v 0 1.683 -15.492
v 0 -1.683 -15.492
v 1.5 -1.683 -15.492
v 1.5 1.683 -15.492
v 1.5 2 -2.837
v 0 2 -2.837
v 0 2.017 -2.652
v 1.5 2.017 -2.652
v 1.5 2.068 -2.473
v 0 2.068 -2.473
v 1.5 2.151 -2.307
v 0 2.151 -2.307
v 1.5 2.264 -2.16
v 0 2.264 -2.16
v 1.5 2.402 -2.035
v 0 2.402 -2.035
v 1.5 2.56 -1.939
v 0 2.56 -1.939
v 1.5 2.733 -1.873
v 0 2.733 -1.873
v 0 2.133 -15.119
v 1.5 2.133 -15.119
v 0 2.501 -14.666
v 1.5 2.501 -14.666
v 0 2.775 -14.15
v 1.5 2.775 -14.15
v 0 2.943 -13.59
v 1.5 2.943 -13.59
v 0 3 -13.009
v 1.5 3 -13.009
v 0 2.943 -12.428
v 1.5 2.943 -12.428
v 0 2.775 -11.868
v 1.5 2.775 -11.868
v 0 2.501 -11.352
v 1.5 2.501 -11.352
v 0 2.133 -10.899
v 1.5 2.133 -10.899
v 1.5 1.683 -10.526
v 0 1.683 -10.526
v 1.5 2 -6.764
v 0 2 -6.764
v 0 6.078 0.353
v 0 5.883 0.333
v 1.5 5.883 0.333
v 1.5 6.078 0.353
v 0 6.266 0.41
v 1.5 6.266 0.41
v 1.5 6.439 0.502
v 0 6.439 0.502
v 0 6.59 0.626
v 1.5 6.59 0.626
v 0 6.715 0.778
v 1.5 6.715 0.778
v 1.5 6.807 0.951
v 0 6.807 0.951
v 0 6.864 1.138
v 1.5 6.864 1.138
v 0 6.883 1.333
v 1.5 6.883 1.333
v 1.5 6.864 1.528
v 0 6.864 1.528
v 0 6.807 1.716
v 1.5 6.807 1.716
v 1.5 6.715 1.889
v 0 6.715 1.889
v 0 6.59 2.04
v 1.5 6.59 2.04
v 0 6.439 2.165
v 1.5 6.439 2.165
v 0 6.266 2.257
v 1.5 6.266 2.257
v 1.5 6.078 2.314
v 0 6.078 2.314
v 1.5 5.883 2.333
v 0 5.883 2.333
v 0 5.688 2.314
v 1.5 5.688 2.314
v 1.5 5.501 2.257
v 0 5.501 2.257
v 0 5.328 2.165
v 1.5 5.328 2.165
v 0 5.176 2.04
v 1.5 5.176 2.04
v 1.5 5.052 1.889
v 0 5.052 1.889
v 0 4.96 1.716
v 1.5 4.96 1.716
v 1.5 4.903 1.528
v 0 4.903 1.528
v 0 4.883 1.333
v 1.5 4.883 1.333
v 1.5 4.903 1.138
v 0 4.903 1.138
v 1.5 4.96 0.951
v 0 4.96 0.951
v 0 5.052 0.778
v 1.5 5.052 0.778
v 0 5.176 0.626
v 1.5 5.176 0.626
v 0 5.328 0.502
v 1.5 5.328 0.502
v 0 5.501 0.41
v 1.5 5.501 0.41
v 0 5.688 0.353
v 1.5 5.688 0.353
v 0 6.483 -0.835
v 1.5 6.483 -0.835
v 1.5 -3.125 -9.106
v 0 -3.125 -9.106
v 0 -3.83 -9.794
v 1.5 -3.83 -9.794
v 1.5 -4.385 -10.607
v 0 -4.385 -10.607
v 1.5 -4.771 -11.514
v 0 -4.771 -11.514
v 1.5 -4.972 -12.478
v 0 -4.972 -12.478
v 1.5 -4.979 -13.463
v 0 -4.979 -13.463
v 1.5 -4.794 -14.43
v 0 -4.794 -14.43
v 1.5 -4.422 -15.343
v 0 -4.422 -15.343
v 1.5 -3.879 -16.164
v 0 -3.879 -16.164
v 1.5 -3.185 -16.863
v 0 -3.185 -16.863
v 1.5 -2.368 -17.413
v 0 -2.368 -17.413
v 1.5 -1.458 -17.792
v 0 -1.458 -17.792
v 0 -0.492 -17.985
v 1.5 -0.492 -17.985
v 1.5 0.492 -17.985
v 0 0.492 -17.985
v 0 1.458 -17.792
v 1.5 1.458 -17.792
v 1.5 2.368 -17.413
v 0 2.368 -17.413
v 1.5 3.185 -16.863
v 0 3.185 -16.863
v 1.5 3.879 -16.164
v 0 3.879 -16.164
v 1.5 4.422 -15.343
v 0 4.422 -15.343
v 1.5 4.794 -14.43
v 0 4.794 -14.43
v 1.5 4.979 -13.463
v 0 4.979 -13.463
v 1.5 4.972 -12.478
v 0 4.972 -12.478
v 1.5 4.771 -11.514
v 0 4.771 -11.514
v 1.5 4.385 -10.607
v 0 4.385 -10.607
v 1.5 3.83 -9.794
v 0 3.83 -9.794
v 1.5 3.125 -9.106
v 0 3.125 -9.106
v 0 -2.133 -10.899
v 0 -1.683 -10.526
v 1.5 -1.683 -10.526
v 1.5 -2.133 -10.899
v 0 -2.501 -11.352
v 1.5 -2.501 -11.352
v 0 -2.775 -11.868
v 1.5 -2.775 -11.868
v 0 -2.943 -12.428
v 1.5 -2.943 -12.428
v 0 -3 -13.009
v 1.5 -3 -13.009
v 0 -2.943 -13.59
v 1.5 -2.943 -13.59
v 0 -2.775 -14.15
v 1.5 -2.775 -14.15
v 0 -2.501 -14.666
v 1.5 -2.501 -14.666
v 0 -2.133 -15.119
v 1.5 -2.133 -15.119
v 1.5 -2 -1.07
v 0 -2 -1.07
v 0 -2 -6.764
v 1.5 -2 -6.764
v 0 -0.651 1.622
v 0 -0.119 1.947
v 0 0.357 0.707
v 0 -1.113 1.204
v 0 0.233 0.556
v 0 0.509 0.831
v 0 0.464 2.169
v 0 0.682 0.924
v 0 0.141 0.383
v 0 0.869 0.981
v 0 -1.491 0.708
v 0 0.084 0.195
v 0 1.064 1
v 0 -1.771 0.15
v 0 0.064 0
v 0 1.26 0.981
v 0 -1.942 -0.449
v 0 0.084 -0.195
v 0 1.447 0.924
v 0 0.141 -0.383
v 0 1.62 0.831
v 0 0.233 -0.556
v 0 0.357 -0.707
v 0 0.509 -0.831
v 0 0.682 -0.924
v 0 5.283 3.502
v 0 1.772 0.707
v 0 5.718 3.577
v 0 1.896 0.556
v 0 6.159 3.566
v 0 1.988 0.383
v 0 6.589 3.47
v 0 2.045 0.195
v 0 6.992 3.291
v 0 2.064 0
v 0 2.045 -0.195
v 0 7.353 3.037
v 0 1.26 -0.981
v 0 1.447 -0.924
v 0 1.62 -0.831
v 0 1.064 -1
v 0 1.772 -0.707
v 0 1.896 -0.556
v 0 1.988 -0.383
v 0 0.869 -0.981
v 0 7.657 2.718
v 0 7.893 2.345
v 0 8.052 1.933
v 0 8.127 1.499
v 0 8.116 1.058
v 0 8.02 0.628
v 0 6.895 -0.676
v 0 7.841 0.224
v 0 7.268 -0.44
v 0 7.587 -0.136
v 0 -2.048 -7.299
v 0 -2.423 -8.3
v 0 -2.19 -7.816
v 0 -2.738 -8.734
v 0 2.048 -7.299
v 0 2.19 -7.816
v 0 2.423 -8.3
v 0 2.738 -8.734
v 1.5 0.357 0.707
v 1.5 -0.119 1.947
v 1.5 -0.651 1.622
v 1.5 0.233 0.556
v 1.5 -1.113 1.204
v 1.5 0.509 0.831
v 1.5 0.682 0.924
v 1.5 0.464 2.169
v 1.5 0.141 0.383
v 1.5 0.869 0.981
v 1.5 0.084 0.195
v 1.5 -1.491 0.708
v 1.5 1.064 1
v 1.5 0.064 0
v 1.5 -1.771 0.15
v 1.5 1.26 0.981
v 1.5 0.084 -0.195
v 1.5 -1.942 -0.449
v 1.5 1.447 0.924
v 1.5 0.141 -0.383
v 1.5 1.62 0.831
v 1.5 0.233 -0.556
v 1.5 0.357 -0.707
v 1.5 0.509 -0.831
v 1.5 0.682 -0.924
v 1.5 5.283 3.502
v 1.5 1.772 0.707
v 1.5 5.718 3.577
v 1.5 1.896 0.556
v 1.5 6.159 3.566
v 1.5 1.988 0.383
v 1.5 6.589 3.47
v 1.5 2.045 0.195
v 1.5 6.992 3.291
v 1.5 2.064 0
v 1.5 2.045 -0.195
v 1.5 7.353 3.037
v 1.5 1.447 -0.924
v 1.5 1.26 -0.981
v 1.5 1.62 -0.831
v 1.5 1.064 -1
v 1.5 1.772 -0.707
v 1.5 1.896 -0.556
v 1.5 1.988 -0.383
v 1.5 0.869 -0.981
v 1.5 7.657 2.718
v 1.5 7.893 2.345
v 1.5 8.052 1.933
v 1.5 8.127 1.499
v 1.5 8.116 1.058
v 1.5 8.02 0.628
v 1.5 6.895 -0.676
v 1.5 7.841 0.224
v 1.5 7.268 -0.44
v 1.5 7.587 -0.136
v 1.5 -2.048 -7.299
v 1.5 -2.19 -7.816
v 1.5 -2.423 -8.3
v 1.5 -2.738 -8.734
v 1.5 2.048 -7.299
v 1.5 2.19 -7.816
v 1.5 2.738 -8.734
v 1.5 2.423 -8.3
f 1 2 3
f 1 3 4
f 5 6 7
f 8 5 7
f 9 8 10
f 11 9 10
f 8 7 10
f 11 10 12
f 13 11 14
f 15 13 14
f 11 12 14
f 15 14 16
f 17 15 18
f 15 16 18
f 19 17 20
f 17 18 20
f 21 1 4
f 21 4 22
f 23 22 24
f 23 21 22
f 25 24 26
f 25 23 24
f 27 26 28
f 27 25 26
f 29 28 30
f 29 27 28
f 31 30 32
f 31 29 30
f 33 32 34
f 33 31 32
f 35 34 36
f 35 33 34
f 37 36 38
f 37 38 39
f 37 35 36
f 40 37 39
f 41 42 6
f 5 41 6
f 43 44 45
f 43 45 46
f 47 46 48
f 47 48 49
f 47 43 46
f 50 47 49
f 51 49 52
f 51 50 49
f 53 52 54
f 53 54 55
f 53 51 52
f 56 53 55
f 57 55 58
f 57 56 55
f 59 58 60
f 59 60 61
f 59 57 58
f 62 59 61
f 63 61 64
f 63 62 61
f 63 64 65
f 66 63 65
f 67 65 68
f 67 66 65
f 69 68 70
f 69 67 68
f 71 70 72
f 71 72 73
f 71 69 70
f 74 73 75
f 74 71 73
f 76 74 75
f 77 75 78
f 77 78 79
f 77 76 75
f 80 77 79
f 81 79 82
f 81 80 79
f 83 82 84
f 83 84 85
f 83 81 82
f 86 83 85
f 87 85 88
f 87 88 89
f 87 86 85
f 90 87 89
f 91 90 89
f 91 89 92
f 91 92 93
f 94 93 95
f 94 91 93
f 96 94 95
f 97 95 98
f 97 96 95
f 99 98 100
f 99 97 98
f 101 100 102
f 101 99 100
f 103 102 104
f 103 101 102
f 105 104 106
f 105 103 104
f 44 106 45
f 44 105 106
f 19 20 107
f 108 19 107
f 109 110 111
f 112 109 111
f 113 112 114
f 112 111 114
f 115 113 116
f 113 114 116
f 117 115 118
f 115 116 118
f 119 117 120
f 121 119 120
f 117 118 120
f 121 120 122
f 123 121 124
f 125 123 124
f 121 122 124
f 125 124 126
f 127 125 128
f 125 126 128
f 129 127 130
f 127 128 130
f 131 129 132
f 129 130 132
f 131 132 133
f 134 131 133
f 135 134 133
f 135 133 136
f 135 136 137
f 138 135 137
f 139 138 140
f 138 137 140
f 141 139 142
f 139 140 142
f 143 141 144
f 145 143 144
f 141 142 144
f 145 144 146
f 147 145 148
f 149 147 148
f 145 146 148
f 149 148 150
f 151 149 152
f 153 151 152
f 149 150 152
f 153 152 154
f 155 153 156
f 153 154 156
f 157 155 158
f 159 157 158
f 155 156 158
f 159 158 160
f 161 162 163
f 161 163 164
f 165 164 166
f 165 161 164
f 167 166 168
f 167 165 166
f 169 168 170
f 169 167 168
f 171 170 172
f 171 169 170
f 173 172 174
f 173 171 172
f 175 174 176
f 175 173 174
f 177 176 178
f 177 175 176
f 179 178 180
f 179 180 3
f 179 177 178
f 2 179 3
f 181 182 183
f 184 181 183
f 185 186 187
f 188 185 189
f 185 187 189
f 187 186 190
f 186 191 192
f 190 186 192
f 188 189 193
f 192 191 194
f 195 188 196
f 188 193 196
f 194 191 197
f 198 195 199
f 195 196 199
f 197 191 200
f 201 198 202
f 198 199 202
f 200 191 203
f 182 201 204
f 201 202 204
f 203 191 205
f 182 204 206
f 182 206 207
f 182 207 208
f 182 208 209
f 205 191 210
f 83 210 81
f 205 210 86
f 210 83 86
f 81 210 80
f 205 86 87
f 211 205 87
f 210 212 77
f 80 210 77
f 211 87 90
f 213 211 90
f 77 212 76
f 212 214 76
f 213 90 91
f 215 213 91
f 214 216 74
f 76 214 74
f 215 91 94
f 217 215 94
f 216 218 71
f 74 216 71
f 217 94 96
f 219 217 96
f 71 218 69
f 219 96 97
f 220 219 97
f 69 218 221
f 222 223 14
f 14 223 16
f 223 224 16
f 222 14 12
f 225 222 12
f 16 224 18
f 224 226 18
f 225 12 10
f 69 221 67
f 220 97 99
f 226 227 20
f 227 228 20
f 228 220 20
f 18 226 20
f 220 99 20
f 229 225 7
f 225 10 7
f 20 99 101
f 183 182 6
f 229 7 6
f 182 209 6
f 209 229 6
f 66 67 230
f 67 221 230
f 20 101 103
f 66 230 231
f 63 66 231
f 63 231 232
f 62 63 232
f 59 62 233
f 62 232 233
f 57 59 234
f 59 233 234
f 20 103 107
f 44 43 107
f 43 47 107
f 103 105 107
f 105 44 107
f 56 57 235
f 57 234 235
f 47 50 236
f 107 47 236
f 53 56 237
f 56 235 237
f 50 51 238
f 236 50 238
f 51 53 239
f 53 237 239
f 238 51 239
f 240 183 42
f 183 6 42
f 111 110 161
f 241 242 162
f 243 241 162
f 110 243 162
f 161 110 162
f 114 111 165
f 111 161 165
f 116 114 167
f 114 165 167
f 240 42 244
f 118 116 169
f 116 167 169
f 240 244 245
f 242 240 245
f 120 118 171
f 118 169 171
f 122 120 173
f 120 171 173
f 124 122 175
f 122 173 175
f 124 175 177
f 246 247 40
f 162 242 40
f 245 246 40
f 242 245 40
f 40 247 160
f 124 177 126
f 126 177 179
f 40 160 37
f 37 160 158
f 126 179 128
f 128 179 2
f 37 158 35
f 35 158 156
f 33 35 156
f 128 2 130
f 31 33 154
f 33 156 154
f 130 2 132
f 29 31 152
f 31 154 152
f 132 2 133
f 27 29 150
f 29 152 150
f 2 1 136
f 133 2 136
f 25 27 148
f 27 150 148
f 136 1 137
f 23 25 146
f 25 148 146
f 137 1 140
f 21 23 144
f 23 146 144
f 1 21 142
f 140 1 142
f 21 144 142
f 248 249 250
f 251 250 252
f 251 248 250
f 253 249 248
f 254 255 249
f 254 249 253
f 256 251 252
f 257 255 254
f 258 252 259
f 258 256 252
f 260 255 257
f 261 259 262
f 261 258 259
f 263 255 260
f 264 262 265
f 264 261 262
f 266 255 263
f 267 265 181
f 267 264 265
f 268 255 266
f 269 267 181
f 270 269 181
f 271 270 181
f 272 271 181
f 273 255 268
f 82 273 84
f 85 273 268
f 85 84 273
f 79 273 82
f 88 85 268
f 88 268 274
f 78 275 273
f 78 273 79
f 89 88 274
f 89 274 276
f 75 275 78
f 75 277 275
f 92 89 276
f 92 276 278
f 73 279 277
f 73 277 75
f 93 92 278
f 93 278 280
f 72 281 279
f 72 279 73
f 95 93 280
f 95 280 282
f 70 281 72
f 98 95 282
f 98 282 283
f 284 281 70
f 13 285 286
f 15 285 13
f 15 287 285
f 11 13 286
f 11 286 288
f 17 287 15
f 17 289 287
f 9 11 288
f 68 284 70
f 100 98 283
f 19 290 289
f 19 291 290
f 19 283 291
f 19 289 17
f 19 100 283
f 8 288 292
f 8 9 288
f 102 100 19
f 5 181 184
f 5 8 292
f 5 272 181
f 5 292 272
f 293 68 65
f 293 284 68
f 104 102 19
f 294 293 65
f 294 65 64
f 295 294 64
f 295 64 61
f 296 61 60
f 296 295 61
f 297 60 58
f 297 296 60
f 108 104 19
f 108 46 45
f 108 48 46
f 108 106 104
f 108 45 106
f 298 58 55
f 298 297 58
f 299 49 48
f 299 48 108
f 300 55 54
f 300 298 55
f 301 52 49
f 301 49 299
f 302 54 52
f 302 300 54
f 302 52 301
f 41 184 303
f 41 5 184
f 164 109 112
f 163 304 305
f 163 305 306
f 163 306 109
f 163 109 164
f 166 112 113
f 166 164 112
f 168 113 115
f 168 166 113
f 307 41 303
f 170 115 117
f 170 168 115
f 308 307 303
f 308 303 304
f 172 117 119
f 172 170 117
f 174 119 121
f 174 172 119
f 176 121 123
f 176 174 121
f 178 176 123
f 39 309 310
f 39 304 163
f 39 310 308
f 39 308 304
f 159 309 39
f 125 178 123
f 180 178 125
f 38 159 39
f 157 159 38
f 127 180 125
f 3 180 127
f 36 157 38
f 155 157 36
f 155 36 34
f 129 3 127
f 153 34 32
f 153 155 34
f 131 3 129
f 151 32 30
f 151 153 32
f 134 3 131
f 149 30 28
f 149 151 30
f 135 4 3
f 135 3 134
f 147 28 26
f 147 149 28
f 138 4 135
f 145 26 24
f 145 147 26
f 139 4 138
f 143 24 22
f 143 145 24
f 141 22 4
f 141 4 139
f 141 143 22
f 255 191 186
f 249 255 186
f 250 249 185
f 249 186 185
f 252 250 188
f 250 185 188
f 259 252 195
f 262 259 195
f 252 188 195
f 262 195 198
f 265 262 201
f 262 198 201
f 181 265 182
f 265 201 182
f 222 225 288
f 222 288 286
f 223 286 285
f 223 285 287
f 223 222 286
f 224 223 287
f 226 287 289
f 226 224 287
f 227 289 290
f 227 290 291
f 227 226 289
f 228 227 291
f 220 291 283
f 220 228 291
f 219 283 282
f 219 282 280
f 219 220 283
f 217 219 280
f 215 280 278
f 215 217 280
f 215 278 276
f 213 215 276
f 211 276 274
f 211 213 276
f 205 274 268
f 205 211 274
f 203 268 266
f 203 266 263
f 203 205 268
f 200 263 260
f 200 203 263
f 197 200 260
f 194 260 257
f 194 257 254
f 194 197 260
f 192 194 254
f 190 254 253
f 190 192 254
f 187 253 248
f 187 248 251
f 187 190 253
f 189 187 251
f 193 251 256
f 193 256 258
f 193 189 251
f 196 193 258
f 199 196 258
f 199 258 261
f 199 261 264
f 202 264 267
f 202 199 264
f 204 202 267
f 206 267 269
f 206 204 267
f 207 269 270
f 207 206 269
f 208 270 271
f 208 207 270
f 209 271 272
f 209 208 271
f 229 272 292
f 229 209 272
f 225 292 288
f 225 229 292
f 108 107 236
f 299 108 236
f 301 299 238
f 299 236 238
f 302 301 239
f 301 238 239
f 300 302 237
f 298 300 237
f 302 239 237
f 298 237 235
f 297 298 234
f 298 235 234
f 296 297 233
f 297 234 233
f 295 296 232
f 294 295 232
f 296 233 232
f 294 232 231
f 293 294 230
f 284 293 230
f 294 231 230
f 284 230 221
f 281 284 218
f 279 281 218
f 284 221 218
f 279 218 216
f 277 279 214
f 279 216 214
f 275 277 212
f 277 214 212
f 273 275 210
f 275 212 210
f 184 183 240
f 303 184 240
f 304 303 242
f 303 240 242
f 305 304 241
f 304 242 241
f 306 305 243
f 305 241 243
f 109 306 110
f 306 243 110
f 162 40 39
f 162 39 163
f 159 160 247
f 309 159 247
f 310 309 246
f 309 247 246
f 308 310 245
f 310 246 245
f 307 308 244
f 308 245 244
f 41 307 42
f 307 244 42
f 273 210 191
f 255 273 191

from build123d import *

# Parameters (mm, degrees)
SKETCH1_R           = 1
BOSS_EXTRUDE3_DEPTH = 1.5


with BuildPart() as part:
    # Sketch1 → Boss-Extrude3 (new body)
    with BuildSketch(Plane(origin=(0, 0, 0), x_dir=(0, 0, -1), z_dir=(1, 0, 0))):
        with BuildLine():
            Line((6.7641026, 1.999999498), (2.83655563, 1.999999498))
            ThreePointArc((2.83655563, 1.999999498), (2.231030071, 2.20417364), (1.872769834, 2.733321904))
            Line((1.872769834, 2.733321904), (0.835129535, 6.483404419))
            ThreePointArc((0.835129535, 6.483404419), (-1.933413156, 8.051897856), (-3.501906514, 5.283355121))
            Line((-3.501906514, 5.283355121), (-2.168518496, 0.464427051))
            ThreePointArc((-2.168518496, 0.464427051), (-0.964537658, -1.313845406), (1.07041083, -1.999999498))
            Line((1.07041083, -1.999999498), (6.7641026, -1.999999498))
            ThreePointArc((6.7641026, -1.999999498), (8.063140814, -2.295836094), (9.105977, -3.124999686))
            ThreePointArc((9.105977, -3.124999686), (18.009101, 0), (9.105977, 3.124999686))
            ThreePointArc((9.105977, 3.124999686), (8.063140814, 2.295836094), (6.7641026, 1.999999498))
        make_face()
        with Locations((-1.333388507, 5.883379832)):
            Circle(SKETCH1_R, mode=Mode.SUBTRACT)
        with Locations((0, 1.064451)):
            Circle(SKETCH1_R, mode=Mode.SUBTRACT)
        with BuildLine():
            Line((10.525768, 1.683168801), (10.525768, -1.683168801))
            ThreePointArc((10.525768, -1.683168801), (13.009101, -3), (15.492434, -1.683168801))
            Line((15.492434, -1.683168801), (15.492434, 1.683168801))
            ThreePointArc((15.492434, 1.683168801), (13.009101, 3), (10.525768, 1.683168801))
        make_face(mode=Mode.SUBTRACT)
    extrude(amount=BOSS_EXTRUDE3_DEPTH)


solid = part.part
